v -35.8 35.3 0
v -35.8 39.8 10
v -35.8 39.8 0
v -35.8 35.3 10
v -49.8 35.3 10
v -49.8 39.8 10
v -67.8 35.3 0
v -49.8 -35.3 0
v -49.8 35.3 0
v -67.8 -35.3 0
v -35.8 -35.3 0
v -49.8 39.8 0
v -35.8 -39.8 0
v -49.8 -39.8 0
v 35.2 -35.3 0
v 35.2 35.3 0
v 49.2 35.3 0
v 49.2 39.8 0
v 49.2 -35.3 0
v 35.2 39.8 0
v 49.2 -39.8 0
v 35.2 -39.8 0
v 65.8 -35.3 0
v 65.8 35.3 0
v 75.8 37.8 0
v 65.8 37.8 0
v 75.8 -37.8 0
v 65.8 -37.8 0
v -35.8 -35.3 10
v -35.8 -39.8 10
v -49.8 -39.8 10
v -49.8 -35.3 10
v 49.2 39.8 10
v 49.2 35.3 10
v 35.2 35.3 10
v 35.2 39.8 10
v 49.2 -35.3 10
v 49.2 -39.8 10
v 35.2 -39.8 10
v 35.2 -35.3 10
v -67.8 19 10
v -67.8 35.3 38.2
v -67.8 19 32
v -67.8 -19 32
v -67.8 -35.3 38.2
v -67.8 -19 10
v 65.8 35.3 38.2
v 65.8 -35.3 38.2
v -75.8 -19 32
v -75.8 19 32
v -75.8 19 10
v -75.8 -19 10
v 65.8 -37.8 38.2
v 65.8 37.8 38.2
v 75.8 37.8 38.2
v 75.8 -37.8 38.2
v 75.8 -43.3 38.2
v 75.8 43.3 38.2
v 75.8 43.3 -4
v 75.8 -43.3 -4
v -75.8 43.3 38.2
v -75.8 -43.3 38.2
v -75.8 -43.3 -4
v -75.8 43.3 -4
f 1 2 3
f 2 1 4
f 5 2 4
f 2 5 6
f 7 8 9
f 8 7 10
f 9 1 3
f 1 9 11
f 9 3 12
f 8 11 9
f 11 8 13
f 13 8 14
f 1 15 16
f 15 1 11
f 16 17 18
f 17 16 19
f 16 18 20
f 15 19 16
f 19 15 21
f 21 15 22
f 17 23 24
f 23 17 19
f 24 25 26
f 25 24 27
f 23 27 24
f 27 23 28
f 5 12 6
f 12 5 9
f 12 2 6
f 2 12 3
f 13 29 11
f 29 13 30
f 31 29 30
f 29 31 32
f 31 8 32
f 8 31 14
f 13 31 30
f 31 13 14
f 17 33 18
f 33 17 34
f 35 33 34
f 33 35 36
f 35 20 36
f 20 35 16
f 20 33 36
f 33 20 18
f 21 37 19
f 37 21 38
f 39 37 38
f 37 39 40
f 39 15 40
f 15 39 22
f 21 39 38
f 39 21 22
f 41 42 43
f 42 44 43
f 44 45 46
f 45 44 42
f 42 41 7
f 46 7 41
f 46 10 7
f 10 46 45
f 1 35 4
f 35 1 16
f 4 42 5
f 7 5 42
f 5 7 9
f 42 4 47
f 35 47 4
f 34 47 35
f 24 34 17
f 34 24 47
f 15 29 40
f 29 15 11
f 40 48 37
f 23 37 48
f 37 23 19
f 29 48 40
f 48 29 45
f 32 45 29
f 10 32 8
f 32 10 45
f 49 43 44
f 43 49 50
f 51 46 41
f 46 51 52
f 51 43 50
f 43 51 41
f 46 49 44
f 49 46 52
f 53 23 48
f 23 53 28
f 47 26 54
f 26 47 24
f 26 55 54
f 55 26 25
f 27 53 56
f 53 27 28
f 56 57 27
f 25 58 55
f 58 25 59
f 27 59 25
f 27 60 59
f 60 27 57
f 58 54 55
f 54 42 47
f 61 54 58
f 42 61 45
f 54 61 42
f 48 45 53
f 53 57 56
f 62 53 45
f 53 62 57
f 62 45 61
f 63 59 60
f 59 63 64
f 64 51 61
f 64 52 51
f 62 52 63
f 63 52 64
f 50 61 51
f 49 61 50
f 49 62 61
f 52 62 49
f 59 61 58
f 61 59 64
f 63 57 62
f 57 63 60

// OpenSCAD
// file: ../../00_common/parameters.scad
// =============================================================================
// OpenMotorBridge - Global CAD Parameters & Settings
// =============================================================================
// File: hardware/cad/scad/00_common/parameters.scad
// Description: Global dimensional constants, manufacturing clearances and
//              circle resolution ($fn) for all OpenSCAD modules.
// =============================================================================

// --- 1. Circle & Curve Resolution ---
$fn = 60; // Smooth cylinders and holes for high-quality MJF 3D printing

// --- 2. Central Main Box Dimensions (3-Tier Sandwich) ---
MAIN_BOX_OUTER_L      = 110.0; // Outer length in X (mm)
MAIN_BOX_OUTER_W      = 74.0;  // Outer width in Y (mm)
MAIN_BOX_LOWER_H      = 17.0;  // Lower case height in Z (mm)
MAIN_BOX_MID_H        = 15.0;  // Mid tray height in Z (mm)
MAIN_BOX_LID_H        = 4.0;   // Lid plate thickness in Z (mm)
MAIN_BOX_WALL         = 2.5;   // Nominal wall thickness (mm)
MAIN_BOX_CORNER_POST  = 7.0;   // Corner clamping screw post size (mm, for M3 hex nut pockets)

// --- 3. Satellite Pod Dimensions (Universal Enlarged Envelope) ---
POD_OUTER_L           = 135.0; // Outer length in X (mm)
POD_OUTER_W           = 70.0;  // Outer width in Y (mm)
POD_OUTER_H           = 38.0;  // Outer height in Z (mm)
POD_WALL              = 3.5;   // Nominal wall thickness (mm)
POD_BULKHEAD_X        = 18.0;  // Partition bulkhead position in X (mm)
POD_CHAMBER_L         = 117.0; // Sliding chamber length in X (mm)
POD_CHAMBER_W         = 63.0;  // Sliding chamber width in Y (mm)
POD_CHAMBER_H         = 31.0;  // Sliding chamber height in Z (mm)

// --- 4. Pod Linear Guide Rails (Poka-Yoke Tongue & Groove) ---
POD_GROOVE_W          = 3.0;   // Internal guide groove width in Z (mm)
POD_GROOVE_DEPTH      = 1.5;   // Internal guide groove depth in Y (mm)
POD_GROOVE_LEFT_Z     = 10.0;  // Center height of left groove (mm)
POD_GROOVE_RIGHT_Z    = 18.0;  // Center height of right groove (mm, asym offset)

CARTRIDGE_TONGUE_W    = 2.6;   // Cartridge tongue rail height in Z (mm, 0.2mm clearance)
CARTRIDGE_TONGUE_PROT = 1.4;   // Cartridge tongue protrusion in Y (mm, 0.1mm clearance)
CARTRIDGE_CHAMFER_L   = 4.0;   // 30° lead-in chamfer nose length (mm)

// --- 5. Cartridge Dimensions (Enlarged Universal Sled) ---
CARTRIDGE_BASE_L      = 116.0; // Sled length in X (mm)
CARTRIDGE_BASE_W      = 58.0;  // Sled width in Y (mm)
CARTRIDGE_BASE_H      = 28.0;  // Sled height in Z (mm)
CARTRIDGE_FACE_L      = 4.0;   // Front faceplate thickness in X (mm)
CARTRIDGE_FACE_W      = 64.0;  // Front faceplate width in Y (mm)
CARTRIDGE_FACE_H      = 34.0;  // Front faceplate height in Z (mm)

// --- 5a. RF Interface & Sealing Dimensions ---
SMA_BORE_R            = 3.25;  // Ø 6.5 mm through-hole for standard SMA bulkhead
SMA_ORECESS_R         = 4.75;  // Ø 9.5 mm recess for waterproof silicone O-ring
SMA_ORECESS_DEPTH     = 1.2;   // 1.2 mm deep O-ring compression pocket

// --- 5b. Magnetic Anti-Theft Lock System ---
LATCH_PIVOT_X         = 58.0;  // Center pivot position along sled X (mm)
LATCH_MAGNET_X        = 46.0;  // Ferromagnetic anchor position along sled X (mm)
LATCH_TOOTH_X         = 70.0;  // Locking sawtooth pawl position along sled X (mm)
LATCH_ARM_H           = 6.0;   // Rocker lever height in Z (mm)
LATCH_ARM_THICK       = 2.6;   // Rocker beam thickness in Y (mm)
LATCH_MAGNET_PIN_DIA  = 6.2;   // Bore for Ø 6.0 mm steel dowel pin (mm)
LATCH_SPRING_DIA      = 3.8;   // Bore for Ø 3.5 mm return compression spring (mm)

// --- 6. Standard Captive Hex Nut Pockets (DIN 934 / DIN 985 with +0.2 mm MJF/FDM clearance) ---
NUT_M2_SW             = 4.2;   // M2 across flats (nominal 4.0 mm)
NUT_M2_H              = 1.8;   // M2 thickness (nominal 1.6 mm)
NUT_M2_5_SW           = 5.2;   // M2.5 across flats (nominal 5.0 mm)
NUT_M2_5_H            = 2.2;   // M2.5 thickness (nominal 2.0 mm)
NUT_M3_SW             = 5.7;   // M3 across flats (nominal 5.5 mm)
NUT_M3_H              = 2.6;   // M3 thickness (nominal 2.4 mm)
NUT_M4_SW             = 7.2;   // M4 across flats (nominal 7.0 mm)
NUT_M4_H              = 3.4;   // M4 thickness (nominal 3.2 mm)
NUT_M5_SW             = 8.2;   // M5 across flats (nominal 8.0 mm)
NUT_M5_H              = 4.2;   // M5 thickness (nominal 4.0 mm)

// Direct Plastic Thread-Forming / Self-Tapping Pilot Holes in PA12 (100% Soldering-Iron Free)
M2_PILOT_HOLE_R       = 0.85;  // Core hole for M2 screws in PA12 (Ø 1.7 mm)
M2_5_PILOT_HOLE_R     = 1.05;  // Core hole for M2.5 screws in PA12 (Ø 2.1 mm)
M3_PILOT_HOLE_R       = 1.25;  // Core hole for M3 screws in PA12 (Ø 2.5 mm)

// --- 7. Screw & Clearance Dimensions ---
M2_SCREW_HOLE_R       = 1.1;   // M2 clearance hole (r = 1.1 mm -> Ø 2.2 mm)
M2_5_SCREW_HOLE_R     = 1.4;   // M2.5 clearance hole (r = 1.4 mm -> Ø 2.8 mm)
M3_SCREW_HOLE_R       = 1.65;  // M3 clearance hole (r = 1.65 mm -> Ø 3.3 mm)
M4_SCREW_HOLE_R       = 2.2;   // M4 clearance hole (r = 2.2 mm -> Ø 4.4 mm)
M8_BORE_R             = 4.0;   // M8 cable through-bore (r = 4.0 mm -> Ø 8.0 mm)
M8_STUDS_OUTER_R      = 6.0;   // M8 neck outer radius (Ø 12.0 mm)

// --- 8. Universal Front Node Enclosure Dimensions (Type E: 98 x 68 x 25 mm) ---
FRONT_NODE_PCB_L      = 82.0;  // PCB length in X (mm, PCBA 05)
FRONT_NODE_PCB_W      = 50.0;  // PCB width in Y (mm, PCBA 05)
FRONT_NODE_PCB_H      = 1.6;   // PCB thickness in Z (mm)
FRONT_NODE_PCB_R      = 2.5;   // PCB corner radius (mm)

FRONT_NODE_CHAMBER_L  = 86.0;  // Internal chamber length in X (mm, 2mm margin per side)
FRONT_NODE_CHAMBER_W  = 56.0;  // Internal chamber width in Y (mm, 3mm margin per side)
FRONT_NODE_TUB_H      = 17.5;  // Lower tub depth in Z (mm)
FRONT_NODE_LID_H      = 7.5;   // Upper lid height in Z (mm)
FRONT_NODE_WALL       = 2.5;   // Wall thickness in HP MJF PA12 (mm)
FRONT_NODE_CORNER_R   = 4.0;   // Outer enclosure corner radius (mm)

FRONT_NODE_OUTER_L    = FRONT_NODE_CHAMBER_L + 2 * FRONT_NODE_WALL + 7.0; // 98.0 mm
FRONT_NODE_OUTER_W    = FRONT_NODE_CHAMBER_W + 2 * FRONT_NODE_WALL + 7.0; // 68.0 mm
FRONT_NODE_OUTER_H    = FRONT_NODE_TUB_H + FRONT_NODE_LID_H;              // 25.0 mm

// PCB Standoff Heights & Radii (100% Soldering-Iron Free)
FRONT_NODE_STANDOFF_H = 3.0;   // Height of PCB standoffs from floor (mm)
FRONT_NODE_STANDOFF_R = 3.0;   // Outer radius of M2.5 screw bosses (mm)
FRONT_NODE_CORE_HOLE_R= M2_5_PILOT_HOLE_R; // Core hole for direct M2.5 screw engagement (Ø 2.1 mm)

// AMPS 4-Hole Mounting Pattern (38 x 30 mm with DIN 934 M4 Captive Nut Pockets)
AMPS_SPACING_X        = 38.0;  // AMPS hole distance in X (mm)
AMPS_SPACING_Y        = 30.0;  // AMPS hole distance in Y (mm)
AMPS_NUT_SW           = NUT_M4_SW; // Captive M4 hex nut pocket across flats (7.2 mm)
AMPS_NUT_H            = NUT_M4_H;  // Captive M4 hex nut pocket depth (3.4 mm)

// Acoustic Vent for Knowles SPH0645 MEMS
FRONT_NODE_MIC_HOLE_R = 1.25;  // Sound canal radius (Ø 2.5 mm)
FRONT_NODE_MIC_MEMB_R = 3.0;   // Gore ePTFE membrane pocket radius (Ø 6.0 mm)
FRONT_NODE_MIC_MEMB_D = 0.8;   // Membrane pocket depth (mm)
// main file
// =============================================================================
// OpenMotorBridge - Satellite Pod: Open-Top Slide-In Dock Core (Aufnahmedock)
// =============================================================================
// File: hardware/cad/scad/02_pod_base/parts/007_pod_slide_dock_core.scad
// Description: Parametric core module defining the open-top cradle cavity for the
//              standard, 100% unchanged universal Pod base housing (135 x 70 x 38 mm).
//              Features:
//              1. 0.5 mm sliding clearance (135.5 x 70.5 x 38.0 mm)
//              2. Open top: Pod roof with Gore-Vent & GNSS patch antenna is exposed
//              3. Front M8 gland neck pocket (facing forward towards seat, -X)
//              4. Rear cartridge entrance mouth (facing rearward towards tail, +X)
//              5. Flank pockets for 4x EPDM strap hook lugs (X = 25 & 110 mm)
//              6. Transverse fender crown cradle at bottom
// =============================================================================

include <../../00_common/parameters.scad>;

// Standard Pod External Dimensions with clearance
DOCK_POD_L = POD_OUTER_L + 0.6; // 135.6 mm
DOCK_POD_W = POD_OUTER_W + 0.6; // 70.6 mm
DOCK_POD_H = POD_OUTER_H + 0.2; // 38.2 mm

// Subtraction tool to hollow out the open-top dock cradle
// Origin centered at (X = 0, Y = 0, Z = floor of dock)
module pod_slide_dock_subtraction(
    dock_l = DOCK_POD_L,
    dock_w = DOCK_POD_W,
    dock_h = DOCK_POD_H,
    open_sky_h = 50.0 // Cut through all material above pod roof
) {
    // 1. Main Pod Cavity (centered in X and Y, sitting at Z = 0 .. dock_h)
    translate([-dock_l/2.0, -dock_w/2.0, 0.0]) {
        // Main pod block plus infinite top clearance so pod roof is 100% exposed
        cube([dock_l, dock_w, dock_h + open_sky_h], center=false);
    }

    // 2. 4x Flank Pockets for Pod EPDM Strap Hooks
    // Hooks are located at X = 25.0 and X = 110.0 from pod front (-dock_l/2.0)
    // Hook width 8 mm, protrusion 3.0 mm, height 5 mm
    hook_x_offsets = [-dock_l/2.0 + 25.0, -dock_l/2.0 + (POD_OUTER_L - 25.0)];
    for (hx = hook_x_offsets) {
        // Left flank pocket (Y = +dock_w/2.0)
        translate([hx - 7.0, dock_w/2.0 - 0.5, 0.0])
            cube([14.0, 5.0, 10.0], center=false);

        // Right flank pocket (Y = -dock_w/2.0 - 4.5)
        translate([hx - 7.0, -dock_w/2.0 - 4.5, 0.0])
            cube([14.0, 5.0, 10.0], center=false);
    }

    // 3. Front Dual-Port Connector Pocket (facing -X towards seat)
    // Spans Port A (M8 at Y = -8.0 mm) and Port B (USB-C at Y = +8.0 mm)
    translate([-dock_l/2.0 - 15.0, -19.0, 19.0 - 9.0])
        cube([16.0, 38.0, 22.0], center=false);

    // 4. Rear Mouth Clearance (facing +X towards tail)
    // Allows the cartridge faceplate (width 74 mm, height 34 mm) to slide through cleanly
    translate([dock_l/2.0 - 2.0, -dock_w/2.0 - 2.5, 0.0])
        cube([30.0, dock_w + 5.0, dock_h + open_sky_h], center=false);
}

// Standalone preview module
module pod_slide_dock_preview() {
    difference() {
        // Outer demonstration block
        translate([-(DOCK_POD_L + 16.0)/2.0, -(DOCK_POD_W + 16.0)/2.0, -4.0])
            cube([DOCK_POD_L + 16.0, DOCK_POD_W + 16.0, DOCK_POD_H + 4.0], center=false);

        // Subtract the open dock cavity
        pod_slide_dock_subtraction();
    }
}

// Standalone execution preview
pod_slide_dock_preview();
